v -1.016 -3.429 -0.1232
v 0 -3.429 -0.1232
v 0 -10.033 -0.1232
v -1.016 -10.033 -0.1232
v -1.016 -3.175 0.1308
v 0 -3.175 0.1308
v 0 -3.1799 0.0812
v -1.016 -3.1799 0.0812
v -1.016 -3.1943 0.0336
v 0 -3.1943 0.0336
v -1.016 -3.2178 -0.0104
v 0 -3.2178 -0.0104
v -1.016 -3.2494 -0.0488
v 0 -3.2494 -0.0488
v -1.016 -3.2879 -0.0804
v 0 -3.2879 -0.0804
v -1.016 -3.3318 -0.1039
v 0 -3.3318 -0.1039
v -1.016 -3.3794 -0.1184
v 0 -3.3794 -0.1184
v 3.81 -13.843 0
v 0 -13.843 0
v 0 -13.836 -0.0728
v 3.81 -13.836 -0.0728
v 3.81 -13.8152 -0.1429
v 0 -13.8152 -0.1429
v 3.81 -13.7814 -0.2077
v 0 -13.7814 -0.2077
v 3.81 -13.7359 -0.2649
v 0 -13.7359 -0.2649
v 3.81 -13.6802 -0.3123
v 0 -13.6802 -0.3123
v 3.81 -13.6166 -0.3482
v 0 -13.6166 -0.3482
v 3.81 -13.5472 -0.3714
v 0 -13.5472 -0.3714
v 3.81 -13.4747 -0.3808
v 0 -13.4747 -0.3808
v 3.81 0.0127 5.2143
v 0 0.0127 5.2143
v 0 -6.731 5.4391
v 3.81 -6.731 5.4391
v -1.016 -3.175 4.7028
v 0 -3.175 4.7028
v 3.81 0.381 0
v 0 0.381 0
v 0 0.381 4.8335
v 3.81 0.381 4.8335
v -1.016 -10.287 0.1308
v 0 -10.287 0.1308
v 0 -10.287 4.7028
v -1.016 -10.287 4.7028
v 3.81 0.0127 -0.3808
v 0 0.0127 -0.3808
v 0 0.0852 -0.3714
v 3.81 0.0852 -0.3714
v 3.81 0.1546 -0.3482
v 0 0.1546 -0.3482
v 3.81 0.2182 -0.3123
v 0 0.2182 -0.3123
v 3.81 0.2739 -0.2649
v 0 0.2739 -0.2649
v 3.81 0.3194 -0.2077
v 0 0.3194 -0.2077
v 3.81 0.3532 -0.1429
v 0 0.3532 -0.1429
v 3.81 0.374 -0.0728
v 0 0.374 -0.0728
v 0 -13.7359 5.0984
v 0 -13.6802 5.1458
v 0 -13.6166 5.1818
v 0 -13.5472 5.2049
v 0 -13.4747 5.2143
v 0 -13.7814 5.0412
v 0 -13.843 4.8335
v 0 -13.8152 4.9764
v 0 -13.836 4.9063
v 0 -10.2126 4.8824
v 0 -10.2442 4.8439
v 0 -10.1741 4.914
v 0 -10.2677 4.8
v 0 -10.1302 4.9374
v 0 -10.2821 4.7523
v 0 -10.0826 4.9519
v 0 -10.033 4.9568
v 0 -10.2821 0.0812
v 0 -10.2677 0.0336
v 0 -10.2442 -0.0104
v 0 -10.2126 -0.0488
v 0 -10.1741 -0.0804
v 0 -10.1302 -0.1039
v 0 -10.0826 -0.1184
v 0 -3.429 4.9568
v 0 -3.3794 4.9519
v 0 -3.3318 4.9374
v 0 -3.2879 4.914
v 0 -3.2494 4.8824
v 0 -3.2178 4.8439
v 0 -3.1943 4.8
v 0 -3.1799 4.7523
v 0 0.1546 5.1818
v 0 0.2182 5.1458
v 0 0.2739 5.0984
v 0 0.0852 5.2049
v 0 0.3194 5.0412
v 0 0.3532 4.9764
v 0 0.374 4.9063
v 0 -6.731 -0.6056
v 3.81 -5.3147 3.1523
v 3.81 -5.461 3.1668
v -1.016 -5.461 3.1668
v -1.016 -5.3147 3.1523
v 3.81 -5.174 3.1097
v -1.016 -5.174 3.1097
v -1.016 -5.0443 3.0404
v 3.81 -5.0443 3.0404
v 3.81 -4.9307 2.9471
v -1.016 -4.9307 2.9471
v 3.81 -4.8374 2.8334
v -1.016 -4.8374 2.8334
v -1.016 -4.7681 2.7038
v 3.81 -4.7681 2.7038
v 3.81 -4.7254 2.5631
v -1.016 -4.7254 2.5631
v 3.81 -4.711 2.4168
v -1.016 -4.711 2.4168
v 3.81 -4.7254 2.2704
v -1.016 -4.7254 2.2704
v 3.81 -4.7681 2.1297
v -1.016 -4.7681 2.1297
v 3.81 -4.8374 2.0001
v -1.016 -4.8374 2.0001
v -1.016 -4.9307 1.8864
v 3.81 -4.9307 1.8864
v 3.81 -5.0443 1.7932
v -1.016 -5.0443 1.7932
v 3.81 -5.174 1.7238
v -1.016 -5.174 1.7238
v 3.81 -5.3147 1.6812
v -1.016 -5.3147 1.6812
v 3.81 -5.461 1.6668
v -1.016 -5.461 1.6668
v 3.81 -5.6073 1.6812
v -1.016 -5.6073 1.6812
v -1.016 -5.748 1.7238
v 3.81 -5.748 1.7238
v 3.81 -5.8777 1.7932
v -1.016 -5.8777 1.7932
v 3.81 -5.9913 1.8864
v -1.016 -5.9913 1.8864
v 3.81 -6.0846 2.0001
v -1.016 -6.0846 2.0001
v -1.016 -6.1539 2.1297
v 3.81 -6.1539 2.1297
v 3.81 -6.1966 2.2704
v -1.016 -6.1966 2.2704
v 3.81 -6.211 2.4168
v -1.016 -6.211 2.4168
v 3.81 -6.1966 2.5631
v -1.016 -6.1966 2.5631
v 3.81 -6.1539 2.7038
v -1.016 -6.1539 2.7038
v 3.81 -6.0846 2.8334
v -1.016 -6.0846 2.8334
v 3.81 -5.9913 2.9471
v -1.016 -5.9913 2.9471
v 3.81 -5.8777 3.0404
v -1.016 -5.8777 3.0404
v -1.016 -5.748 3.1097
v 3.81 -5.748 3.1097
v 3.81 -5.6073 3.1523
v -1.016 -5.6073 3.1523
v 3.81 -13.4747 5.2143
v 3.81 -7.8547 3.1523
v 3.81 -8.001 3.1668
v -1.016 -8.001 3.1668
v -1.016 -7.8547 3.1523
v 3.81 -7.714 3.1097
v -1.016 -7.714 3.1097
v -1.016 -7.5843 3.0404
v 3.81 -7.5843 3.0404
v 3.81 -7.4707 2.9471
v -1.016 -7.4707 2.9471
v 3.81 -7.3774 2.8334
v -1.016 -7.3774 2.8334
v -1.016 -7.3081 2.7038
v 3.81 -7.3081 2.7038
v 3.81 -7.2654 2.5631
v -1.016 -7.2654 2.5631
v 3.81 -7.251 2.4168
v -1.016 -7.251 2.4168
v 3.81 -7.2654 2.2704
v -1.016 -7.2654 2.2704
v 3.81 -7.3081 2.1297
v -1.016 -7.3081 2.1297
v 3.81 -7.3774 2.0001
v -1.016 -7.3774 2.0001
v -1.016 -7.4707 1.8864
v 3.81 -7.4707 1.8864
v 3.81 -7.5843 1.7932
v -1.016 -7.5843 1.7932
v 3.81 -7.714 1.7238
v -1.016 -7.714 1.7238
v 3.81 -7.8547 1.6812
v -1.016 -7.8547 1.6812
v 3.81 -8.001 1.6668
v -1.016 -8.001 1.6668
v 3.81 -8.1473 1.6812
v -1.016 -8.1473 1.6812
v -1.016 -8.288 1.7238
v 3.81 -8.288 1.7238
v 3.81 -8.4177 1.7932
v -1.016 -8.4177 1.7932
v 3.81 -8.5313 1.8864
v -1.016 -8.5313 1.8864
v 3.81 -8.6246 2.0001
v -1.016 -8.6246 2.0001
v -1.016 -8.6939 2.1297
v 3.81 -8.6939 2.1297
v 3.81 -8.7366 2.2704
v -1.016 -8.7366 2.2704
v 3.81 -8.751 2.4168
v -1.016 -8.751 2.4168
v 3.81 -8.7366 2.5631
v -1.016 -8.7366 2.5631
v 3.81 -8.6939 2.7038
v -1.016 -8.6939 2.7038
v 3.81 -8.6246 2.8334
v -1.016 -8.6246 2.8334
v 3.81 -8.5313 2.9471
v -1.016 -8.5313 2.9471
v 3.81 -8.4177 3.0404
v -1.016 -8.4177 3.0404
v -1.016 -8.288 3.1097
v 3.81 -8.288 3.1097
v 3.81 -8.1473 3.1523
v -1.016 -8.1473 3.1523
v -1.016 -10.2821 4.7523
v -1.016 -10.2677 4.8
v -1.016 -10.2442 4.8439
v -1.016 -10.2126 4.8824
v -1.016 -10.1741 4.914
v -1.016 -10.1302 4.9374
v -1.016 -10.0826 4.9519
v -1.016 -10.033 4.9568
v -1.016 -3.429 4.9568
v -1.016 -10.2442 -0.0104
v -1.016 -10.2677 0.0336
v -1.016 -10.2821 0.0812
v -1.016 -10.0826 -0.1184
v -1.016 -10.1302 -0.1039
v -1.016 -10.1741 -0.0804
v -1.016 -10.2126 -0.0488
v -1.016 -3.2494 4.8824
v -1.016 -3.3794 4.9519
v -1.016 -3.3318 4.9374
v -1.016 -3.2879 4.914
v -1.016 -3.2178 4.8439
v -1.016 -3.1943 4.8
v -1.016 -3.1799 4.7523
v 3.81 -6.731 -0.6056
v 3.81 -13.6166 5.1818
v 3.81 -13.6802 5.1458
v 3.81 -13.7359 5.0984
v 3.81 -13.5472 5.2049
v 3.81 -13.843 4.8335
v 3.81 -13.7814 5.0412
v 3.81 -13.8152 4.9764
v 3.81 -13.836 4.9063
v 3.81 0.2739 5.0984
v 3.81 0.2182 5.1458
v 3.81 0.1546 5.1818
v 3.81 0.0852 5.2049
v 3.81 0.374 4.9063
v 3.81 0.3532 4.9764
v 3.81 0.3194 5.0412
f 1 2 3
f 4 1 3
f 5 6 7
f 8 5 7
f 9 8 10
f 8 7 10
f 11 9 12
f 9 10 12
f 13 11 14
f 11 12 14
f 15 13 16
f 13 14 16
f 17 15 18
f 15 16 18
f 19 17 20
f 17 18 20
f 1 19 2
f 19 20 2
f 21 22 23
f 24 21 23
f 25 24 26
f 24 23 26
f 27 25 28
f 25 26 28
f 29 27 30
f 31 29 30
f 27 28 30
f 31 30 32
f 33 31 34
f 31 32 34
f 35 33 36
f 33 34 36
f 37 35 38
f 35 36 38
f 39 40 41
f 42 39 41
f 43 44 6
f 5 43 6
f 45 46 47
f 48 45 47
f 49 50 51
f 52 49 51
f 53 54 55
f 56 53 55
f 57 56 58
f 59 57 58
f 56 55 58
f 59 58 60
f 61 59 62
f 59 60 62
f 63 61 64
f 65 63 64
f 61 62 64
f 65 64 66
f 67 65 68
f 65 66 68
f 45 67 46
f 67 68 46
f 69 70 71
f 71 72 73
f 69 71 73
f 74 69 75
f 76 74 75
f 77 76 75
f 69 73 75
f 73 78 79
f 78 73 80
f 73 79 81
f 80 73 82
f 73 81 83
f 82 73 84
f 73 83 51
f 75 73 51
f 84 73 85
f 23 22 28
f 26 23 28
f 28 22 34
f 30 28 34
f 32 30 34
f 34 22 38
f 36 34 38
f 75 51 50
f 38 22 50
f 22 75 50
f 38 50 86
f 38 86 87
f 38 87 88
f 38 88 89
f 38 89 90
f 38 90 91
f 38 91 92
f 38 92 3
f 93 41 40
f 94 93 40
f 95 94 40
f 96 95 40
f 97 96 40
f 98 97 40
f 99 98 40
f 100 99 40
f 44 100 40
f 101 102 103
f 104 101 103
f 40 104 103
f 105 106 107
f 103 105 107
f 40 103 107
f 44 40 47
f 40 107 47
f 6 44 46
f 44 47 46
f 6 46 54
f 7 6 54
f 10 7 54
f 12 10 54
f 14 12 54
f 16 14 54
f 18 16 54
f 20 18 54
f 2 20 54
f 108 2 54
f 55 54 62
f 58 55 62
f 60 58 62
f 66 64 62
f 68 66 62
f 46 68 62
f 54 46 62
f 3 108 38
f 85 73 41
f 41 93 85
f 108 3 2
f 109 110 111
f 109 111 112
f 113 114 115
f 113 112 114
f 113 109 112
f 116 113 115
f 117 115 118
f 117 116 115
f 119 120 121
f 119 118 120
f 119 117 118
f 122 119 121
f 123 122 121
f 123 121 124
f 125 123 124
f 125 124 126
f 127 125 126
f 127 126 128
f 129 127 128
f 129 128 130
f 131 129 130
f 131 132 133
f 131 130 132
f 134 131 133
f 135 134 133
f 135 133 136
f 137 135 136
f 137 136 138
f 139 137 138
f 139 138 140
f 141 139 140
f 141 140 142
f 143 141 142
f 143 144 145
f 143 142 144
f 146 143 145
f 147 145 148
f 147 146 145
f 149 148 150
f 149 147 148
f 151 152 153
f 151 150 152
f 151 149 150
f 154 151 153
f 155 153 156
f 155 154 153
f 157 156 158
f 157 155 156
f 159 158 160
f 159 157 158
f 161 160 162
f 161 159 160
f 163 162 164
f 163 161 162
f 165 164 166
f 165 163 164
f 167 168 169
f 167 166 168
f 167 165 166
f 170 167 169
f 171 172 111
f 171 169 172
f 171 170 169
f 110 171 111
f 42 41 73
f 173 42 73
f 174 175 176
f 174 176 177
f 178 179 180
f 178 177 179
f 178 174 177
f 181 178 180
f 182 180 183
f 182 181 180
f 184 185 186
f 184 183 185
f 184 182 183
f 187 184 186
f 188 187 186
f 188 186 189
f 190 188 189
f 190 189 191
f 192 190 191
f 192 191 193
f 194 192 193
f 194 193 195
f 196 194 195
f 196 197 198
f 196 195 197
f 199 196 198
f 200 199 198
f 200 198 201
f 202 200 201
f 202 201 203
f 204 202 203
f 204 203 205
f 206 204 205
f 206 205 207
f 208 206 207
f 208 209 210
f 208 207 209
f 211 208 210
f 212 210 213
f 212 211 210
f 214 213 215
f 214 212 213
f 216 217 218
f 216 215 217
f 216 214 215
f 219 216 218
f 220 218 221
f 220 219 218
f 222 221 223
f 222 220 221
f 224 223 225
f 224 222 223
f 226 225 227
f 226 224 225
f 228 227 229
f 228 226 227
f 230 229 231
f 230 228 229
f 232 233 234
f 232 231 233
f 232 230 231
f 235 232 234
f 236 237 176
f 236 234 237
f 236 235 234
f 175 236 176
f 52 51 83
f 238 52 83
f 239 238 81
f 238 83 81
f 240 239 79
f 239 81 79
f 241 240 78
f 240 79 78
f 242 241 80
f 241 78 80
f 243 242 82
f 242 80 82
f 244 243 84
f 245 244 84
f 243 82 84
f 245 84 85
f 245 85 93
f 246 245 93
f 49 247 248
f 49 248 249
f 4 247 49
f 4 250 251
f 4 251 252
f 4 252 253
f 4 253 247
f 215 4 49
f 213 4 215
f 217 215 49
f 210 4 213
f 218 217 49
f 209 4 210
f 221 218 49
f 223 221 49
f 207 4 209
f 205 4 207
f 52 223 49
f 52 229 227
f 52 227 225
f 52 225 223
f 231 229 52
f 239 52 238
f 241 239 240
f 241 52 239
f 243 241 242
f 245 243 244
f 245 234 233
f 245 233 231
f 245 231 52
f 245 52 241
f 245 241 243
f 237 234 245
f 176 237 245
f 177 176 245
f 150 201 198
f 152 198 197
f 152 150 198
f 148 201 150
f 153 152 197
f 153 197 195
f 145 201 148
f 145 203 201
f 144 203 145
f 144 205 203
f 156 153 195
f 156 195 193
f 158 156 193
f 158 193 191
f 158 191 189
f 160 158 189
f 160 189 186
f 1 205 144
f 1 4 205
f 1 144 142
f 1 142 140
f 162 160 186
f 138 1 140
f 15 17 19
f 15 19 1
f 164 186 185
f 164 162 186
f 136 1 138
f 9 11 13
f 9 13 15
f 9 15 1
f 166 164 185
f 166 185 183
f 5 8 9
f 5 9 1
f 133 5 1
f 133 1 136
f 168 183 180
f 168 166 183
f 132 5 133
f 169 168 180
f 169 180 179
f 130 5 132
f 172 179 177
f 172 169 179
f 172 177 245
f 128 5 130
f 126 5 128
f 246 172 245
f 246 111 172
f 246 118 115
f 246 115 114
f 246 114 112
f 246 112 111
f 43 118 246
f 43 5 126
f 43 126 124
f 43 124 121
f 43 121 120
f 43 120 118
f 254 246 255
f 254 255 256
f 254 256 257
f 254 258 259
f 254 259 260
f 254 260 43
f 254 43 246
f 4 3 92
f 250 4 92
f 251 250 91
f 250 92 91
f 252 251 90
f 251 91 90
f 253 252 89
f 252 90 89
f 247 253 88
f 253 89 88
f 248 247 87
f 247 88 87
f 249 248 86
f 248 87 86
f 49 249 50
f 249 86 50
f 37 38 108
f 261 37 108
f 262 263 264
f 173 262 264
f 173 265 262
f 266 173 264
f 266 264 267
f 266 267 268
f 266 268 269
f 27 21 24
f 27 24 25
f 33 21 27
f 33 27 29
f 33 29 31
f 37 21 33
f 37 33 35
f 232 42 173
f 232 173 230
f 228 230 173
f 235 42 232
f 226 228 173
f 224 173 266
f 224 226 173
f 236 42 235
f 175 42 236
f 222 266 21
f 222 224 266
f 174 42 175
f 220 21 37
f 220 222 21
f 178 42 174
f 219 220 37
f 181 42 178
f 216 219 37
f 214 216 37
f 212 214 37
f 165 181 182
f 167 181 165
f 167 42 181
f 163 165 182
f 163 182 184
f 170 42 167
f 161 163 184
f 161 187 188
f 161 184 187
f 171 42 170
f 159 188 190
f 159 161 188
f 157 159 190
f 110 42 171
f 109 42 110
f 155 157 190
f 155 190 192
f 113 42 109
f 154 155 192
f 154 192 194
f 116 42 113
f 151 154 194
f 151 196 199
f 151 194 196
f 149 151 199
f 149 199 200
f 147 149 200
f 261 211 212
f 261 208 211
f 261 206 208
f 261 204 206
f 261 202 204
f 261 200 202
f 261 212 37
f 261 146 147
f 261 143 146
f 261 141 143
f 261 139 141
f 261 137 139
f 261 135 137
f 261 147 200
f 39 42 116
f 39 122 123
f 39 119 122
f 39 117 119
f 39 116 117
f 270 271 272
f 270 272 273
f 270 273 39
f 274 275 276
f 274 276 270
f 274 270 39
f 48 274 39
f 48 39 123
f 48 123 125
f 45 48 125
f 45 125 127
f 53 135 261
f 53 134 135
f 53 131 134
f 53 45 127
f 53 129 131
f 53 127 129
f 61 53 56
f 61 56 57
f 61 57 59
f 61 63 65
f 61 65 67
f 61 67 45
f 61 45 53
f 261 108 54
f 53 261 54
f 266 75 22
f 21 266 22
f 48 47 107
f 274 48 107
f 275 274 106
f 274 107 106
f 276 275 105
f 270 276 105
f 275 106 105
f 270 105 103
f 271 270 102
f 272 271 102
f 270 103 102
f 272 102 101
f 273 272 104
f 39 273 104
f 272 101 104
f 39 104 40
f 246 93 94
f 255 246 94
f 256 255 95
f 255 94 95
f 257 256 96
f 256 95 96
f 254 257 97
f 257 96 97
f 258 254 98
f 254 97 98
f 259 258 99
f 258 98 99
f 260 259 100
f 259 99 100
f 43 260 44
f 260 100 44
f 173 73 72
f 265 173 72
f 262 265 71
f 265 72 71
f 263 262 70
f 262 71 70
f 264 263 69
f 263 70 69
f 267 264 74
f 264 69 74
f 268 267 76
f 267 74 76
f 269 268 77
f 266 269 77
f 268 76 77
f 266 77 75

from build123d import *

# Parameters (mm, degrees)
BOSS_EXTRUDE1_DEPTH     = 3.81
BOSS_EXTRUDE2_DEPTH     = 1.016
CUT_EXTRUDE1_DEPTH      = 16.636574662
CUT_EXTRUDE1_DEPTH_BACK = 16.636574662
SKETCH6_R               = 0.75


with BuildPart() as part:
    # Sketch1 → Boss-Extrude1 (new body)
    with BuildSketch(Plane(origin=(0, 0, 0), x_dir=(0, 0, -1), z_dir=(1, 0, 0))):
        with BuildLine():
            Line((0.380788543, -13.474691937), (0.605560313, -6.731))
            Line((0.605560313, -6.731), (0.380788543, 0.012691937))
            ThreePointArc((0.380788543, 0.012691937), (0.2648824, 0.273858201), (0, 0.381))
            Line((0, 0.381), (-4.833515176, 0.381))
            ThreePointArc((-4.833515176, 0.381), (-5.098397576, 0.273858201), (-5.214303719, 0.012691937))
            Line((-5.214303719, 0.012691937), (-5.439075489, -6.731))
            Line((-5.439075489, -6.731), (-5.214303719, -13.474691937))
            ThreePointArc((-5.214303719, -13.474691937), (-5.098397576, -13.735858201), (-4.833515176, -13.843))
            Line((-4.833515176, -13.843), (0, -13.843))
            ThreePointArc((0, -13.843), (0.2648824, -13.735858201), (0.380788543, -13.474691937))
        make_face()
    extrude(amount=BOSS_EXTRUDE1_DEPTH)

    # Sketch5 → Boss-Extrude2 (add)
    with BuildSketch(Plane.ZY):
        with BuildLine():
            Line((0.130757588, -10.287), (4.702757588, -10.287))
            ThreePointArc((4.702757588, -10.287), (4.88236271, -10.212605122), (4.956757588, -10.033))
            Line((4.956757588, -10.033), (4.956757588, -3.429))
            ThreePointArc((4.956757588, -3.429), (4.88236271, -3.249394878), (4.702757588, -3.175))
            Line((4.702757588, -3.175), (0.130757588, -3.175))
            ThreePointArc((0.130757588, -3.175), (-0.048847535, -3.249394878), (-0.123242412, -3.429))
            Line((-0.123242412, -3.429), (-0.123242412, -10.033))
            ThreePointArc((-0.123242412, -10.033), (-0.048847535, -10.212605122), (0.130757588, -10.287))
        make_face()
    extrude(amount=BOSS_EXTRUDE2_DEPTH)

    # Sketch6 → Cut-Extrude1 (cut, two sides: drawn at the far end of the back side and taken through both)
    with BuildSketch(Plane.ZY.offset(1.016).offset(-CUT_EXTRUDE1_DEPTH_BACK)):
        with Locations((2.416757588, -5.461)):
            Circle(SKETCH6_R)
        with Locations((2.416757588, -8.001)):
            Circle(SKETCH6_R)
    extrude(amount=CUT_EXTRUDE1_DEPTH + CUT_EXTRUDE1_DEPTH_BACK, mode=Mode.SUBTRACT)


solid = part.part
